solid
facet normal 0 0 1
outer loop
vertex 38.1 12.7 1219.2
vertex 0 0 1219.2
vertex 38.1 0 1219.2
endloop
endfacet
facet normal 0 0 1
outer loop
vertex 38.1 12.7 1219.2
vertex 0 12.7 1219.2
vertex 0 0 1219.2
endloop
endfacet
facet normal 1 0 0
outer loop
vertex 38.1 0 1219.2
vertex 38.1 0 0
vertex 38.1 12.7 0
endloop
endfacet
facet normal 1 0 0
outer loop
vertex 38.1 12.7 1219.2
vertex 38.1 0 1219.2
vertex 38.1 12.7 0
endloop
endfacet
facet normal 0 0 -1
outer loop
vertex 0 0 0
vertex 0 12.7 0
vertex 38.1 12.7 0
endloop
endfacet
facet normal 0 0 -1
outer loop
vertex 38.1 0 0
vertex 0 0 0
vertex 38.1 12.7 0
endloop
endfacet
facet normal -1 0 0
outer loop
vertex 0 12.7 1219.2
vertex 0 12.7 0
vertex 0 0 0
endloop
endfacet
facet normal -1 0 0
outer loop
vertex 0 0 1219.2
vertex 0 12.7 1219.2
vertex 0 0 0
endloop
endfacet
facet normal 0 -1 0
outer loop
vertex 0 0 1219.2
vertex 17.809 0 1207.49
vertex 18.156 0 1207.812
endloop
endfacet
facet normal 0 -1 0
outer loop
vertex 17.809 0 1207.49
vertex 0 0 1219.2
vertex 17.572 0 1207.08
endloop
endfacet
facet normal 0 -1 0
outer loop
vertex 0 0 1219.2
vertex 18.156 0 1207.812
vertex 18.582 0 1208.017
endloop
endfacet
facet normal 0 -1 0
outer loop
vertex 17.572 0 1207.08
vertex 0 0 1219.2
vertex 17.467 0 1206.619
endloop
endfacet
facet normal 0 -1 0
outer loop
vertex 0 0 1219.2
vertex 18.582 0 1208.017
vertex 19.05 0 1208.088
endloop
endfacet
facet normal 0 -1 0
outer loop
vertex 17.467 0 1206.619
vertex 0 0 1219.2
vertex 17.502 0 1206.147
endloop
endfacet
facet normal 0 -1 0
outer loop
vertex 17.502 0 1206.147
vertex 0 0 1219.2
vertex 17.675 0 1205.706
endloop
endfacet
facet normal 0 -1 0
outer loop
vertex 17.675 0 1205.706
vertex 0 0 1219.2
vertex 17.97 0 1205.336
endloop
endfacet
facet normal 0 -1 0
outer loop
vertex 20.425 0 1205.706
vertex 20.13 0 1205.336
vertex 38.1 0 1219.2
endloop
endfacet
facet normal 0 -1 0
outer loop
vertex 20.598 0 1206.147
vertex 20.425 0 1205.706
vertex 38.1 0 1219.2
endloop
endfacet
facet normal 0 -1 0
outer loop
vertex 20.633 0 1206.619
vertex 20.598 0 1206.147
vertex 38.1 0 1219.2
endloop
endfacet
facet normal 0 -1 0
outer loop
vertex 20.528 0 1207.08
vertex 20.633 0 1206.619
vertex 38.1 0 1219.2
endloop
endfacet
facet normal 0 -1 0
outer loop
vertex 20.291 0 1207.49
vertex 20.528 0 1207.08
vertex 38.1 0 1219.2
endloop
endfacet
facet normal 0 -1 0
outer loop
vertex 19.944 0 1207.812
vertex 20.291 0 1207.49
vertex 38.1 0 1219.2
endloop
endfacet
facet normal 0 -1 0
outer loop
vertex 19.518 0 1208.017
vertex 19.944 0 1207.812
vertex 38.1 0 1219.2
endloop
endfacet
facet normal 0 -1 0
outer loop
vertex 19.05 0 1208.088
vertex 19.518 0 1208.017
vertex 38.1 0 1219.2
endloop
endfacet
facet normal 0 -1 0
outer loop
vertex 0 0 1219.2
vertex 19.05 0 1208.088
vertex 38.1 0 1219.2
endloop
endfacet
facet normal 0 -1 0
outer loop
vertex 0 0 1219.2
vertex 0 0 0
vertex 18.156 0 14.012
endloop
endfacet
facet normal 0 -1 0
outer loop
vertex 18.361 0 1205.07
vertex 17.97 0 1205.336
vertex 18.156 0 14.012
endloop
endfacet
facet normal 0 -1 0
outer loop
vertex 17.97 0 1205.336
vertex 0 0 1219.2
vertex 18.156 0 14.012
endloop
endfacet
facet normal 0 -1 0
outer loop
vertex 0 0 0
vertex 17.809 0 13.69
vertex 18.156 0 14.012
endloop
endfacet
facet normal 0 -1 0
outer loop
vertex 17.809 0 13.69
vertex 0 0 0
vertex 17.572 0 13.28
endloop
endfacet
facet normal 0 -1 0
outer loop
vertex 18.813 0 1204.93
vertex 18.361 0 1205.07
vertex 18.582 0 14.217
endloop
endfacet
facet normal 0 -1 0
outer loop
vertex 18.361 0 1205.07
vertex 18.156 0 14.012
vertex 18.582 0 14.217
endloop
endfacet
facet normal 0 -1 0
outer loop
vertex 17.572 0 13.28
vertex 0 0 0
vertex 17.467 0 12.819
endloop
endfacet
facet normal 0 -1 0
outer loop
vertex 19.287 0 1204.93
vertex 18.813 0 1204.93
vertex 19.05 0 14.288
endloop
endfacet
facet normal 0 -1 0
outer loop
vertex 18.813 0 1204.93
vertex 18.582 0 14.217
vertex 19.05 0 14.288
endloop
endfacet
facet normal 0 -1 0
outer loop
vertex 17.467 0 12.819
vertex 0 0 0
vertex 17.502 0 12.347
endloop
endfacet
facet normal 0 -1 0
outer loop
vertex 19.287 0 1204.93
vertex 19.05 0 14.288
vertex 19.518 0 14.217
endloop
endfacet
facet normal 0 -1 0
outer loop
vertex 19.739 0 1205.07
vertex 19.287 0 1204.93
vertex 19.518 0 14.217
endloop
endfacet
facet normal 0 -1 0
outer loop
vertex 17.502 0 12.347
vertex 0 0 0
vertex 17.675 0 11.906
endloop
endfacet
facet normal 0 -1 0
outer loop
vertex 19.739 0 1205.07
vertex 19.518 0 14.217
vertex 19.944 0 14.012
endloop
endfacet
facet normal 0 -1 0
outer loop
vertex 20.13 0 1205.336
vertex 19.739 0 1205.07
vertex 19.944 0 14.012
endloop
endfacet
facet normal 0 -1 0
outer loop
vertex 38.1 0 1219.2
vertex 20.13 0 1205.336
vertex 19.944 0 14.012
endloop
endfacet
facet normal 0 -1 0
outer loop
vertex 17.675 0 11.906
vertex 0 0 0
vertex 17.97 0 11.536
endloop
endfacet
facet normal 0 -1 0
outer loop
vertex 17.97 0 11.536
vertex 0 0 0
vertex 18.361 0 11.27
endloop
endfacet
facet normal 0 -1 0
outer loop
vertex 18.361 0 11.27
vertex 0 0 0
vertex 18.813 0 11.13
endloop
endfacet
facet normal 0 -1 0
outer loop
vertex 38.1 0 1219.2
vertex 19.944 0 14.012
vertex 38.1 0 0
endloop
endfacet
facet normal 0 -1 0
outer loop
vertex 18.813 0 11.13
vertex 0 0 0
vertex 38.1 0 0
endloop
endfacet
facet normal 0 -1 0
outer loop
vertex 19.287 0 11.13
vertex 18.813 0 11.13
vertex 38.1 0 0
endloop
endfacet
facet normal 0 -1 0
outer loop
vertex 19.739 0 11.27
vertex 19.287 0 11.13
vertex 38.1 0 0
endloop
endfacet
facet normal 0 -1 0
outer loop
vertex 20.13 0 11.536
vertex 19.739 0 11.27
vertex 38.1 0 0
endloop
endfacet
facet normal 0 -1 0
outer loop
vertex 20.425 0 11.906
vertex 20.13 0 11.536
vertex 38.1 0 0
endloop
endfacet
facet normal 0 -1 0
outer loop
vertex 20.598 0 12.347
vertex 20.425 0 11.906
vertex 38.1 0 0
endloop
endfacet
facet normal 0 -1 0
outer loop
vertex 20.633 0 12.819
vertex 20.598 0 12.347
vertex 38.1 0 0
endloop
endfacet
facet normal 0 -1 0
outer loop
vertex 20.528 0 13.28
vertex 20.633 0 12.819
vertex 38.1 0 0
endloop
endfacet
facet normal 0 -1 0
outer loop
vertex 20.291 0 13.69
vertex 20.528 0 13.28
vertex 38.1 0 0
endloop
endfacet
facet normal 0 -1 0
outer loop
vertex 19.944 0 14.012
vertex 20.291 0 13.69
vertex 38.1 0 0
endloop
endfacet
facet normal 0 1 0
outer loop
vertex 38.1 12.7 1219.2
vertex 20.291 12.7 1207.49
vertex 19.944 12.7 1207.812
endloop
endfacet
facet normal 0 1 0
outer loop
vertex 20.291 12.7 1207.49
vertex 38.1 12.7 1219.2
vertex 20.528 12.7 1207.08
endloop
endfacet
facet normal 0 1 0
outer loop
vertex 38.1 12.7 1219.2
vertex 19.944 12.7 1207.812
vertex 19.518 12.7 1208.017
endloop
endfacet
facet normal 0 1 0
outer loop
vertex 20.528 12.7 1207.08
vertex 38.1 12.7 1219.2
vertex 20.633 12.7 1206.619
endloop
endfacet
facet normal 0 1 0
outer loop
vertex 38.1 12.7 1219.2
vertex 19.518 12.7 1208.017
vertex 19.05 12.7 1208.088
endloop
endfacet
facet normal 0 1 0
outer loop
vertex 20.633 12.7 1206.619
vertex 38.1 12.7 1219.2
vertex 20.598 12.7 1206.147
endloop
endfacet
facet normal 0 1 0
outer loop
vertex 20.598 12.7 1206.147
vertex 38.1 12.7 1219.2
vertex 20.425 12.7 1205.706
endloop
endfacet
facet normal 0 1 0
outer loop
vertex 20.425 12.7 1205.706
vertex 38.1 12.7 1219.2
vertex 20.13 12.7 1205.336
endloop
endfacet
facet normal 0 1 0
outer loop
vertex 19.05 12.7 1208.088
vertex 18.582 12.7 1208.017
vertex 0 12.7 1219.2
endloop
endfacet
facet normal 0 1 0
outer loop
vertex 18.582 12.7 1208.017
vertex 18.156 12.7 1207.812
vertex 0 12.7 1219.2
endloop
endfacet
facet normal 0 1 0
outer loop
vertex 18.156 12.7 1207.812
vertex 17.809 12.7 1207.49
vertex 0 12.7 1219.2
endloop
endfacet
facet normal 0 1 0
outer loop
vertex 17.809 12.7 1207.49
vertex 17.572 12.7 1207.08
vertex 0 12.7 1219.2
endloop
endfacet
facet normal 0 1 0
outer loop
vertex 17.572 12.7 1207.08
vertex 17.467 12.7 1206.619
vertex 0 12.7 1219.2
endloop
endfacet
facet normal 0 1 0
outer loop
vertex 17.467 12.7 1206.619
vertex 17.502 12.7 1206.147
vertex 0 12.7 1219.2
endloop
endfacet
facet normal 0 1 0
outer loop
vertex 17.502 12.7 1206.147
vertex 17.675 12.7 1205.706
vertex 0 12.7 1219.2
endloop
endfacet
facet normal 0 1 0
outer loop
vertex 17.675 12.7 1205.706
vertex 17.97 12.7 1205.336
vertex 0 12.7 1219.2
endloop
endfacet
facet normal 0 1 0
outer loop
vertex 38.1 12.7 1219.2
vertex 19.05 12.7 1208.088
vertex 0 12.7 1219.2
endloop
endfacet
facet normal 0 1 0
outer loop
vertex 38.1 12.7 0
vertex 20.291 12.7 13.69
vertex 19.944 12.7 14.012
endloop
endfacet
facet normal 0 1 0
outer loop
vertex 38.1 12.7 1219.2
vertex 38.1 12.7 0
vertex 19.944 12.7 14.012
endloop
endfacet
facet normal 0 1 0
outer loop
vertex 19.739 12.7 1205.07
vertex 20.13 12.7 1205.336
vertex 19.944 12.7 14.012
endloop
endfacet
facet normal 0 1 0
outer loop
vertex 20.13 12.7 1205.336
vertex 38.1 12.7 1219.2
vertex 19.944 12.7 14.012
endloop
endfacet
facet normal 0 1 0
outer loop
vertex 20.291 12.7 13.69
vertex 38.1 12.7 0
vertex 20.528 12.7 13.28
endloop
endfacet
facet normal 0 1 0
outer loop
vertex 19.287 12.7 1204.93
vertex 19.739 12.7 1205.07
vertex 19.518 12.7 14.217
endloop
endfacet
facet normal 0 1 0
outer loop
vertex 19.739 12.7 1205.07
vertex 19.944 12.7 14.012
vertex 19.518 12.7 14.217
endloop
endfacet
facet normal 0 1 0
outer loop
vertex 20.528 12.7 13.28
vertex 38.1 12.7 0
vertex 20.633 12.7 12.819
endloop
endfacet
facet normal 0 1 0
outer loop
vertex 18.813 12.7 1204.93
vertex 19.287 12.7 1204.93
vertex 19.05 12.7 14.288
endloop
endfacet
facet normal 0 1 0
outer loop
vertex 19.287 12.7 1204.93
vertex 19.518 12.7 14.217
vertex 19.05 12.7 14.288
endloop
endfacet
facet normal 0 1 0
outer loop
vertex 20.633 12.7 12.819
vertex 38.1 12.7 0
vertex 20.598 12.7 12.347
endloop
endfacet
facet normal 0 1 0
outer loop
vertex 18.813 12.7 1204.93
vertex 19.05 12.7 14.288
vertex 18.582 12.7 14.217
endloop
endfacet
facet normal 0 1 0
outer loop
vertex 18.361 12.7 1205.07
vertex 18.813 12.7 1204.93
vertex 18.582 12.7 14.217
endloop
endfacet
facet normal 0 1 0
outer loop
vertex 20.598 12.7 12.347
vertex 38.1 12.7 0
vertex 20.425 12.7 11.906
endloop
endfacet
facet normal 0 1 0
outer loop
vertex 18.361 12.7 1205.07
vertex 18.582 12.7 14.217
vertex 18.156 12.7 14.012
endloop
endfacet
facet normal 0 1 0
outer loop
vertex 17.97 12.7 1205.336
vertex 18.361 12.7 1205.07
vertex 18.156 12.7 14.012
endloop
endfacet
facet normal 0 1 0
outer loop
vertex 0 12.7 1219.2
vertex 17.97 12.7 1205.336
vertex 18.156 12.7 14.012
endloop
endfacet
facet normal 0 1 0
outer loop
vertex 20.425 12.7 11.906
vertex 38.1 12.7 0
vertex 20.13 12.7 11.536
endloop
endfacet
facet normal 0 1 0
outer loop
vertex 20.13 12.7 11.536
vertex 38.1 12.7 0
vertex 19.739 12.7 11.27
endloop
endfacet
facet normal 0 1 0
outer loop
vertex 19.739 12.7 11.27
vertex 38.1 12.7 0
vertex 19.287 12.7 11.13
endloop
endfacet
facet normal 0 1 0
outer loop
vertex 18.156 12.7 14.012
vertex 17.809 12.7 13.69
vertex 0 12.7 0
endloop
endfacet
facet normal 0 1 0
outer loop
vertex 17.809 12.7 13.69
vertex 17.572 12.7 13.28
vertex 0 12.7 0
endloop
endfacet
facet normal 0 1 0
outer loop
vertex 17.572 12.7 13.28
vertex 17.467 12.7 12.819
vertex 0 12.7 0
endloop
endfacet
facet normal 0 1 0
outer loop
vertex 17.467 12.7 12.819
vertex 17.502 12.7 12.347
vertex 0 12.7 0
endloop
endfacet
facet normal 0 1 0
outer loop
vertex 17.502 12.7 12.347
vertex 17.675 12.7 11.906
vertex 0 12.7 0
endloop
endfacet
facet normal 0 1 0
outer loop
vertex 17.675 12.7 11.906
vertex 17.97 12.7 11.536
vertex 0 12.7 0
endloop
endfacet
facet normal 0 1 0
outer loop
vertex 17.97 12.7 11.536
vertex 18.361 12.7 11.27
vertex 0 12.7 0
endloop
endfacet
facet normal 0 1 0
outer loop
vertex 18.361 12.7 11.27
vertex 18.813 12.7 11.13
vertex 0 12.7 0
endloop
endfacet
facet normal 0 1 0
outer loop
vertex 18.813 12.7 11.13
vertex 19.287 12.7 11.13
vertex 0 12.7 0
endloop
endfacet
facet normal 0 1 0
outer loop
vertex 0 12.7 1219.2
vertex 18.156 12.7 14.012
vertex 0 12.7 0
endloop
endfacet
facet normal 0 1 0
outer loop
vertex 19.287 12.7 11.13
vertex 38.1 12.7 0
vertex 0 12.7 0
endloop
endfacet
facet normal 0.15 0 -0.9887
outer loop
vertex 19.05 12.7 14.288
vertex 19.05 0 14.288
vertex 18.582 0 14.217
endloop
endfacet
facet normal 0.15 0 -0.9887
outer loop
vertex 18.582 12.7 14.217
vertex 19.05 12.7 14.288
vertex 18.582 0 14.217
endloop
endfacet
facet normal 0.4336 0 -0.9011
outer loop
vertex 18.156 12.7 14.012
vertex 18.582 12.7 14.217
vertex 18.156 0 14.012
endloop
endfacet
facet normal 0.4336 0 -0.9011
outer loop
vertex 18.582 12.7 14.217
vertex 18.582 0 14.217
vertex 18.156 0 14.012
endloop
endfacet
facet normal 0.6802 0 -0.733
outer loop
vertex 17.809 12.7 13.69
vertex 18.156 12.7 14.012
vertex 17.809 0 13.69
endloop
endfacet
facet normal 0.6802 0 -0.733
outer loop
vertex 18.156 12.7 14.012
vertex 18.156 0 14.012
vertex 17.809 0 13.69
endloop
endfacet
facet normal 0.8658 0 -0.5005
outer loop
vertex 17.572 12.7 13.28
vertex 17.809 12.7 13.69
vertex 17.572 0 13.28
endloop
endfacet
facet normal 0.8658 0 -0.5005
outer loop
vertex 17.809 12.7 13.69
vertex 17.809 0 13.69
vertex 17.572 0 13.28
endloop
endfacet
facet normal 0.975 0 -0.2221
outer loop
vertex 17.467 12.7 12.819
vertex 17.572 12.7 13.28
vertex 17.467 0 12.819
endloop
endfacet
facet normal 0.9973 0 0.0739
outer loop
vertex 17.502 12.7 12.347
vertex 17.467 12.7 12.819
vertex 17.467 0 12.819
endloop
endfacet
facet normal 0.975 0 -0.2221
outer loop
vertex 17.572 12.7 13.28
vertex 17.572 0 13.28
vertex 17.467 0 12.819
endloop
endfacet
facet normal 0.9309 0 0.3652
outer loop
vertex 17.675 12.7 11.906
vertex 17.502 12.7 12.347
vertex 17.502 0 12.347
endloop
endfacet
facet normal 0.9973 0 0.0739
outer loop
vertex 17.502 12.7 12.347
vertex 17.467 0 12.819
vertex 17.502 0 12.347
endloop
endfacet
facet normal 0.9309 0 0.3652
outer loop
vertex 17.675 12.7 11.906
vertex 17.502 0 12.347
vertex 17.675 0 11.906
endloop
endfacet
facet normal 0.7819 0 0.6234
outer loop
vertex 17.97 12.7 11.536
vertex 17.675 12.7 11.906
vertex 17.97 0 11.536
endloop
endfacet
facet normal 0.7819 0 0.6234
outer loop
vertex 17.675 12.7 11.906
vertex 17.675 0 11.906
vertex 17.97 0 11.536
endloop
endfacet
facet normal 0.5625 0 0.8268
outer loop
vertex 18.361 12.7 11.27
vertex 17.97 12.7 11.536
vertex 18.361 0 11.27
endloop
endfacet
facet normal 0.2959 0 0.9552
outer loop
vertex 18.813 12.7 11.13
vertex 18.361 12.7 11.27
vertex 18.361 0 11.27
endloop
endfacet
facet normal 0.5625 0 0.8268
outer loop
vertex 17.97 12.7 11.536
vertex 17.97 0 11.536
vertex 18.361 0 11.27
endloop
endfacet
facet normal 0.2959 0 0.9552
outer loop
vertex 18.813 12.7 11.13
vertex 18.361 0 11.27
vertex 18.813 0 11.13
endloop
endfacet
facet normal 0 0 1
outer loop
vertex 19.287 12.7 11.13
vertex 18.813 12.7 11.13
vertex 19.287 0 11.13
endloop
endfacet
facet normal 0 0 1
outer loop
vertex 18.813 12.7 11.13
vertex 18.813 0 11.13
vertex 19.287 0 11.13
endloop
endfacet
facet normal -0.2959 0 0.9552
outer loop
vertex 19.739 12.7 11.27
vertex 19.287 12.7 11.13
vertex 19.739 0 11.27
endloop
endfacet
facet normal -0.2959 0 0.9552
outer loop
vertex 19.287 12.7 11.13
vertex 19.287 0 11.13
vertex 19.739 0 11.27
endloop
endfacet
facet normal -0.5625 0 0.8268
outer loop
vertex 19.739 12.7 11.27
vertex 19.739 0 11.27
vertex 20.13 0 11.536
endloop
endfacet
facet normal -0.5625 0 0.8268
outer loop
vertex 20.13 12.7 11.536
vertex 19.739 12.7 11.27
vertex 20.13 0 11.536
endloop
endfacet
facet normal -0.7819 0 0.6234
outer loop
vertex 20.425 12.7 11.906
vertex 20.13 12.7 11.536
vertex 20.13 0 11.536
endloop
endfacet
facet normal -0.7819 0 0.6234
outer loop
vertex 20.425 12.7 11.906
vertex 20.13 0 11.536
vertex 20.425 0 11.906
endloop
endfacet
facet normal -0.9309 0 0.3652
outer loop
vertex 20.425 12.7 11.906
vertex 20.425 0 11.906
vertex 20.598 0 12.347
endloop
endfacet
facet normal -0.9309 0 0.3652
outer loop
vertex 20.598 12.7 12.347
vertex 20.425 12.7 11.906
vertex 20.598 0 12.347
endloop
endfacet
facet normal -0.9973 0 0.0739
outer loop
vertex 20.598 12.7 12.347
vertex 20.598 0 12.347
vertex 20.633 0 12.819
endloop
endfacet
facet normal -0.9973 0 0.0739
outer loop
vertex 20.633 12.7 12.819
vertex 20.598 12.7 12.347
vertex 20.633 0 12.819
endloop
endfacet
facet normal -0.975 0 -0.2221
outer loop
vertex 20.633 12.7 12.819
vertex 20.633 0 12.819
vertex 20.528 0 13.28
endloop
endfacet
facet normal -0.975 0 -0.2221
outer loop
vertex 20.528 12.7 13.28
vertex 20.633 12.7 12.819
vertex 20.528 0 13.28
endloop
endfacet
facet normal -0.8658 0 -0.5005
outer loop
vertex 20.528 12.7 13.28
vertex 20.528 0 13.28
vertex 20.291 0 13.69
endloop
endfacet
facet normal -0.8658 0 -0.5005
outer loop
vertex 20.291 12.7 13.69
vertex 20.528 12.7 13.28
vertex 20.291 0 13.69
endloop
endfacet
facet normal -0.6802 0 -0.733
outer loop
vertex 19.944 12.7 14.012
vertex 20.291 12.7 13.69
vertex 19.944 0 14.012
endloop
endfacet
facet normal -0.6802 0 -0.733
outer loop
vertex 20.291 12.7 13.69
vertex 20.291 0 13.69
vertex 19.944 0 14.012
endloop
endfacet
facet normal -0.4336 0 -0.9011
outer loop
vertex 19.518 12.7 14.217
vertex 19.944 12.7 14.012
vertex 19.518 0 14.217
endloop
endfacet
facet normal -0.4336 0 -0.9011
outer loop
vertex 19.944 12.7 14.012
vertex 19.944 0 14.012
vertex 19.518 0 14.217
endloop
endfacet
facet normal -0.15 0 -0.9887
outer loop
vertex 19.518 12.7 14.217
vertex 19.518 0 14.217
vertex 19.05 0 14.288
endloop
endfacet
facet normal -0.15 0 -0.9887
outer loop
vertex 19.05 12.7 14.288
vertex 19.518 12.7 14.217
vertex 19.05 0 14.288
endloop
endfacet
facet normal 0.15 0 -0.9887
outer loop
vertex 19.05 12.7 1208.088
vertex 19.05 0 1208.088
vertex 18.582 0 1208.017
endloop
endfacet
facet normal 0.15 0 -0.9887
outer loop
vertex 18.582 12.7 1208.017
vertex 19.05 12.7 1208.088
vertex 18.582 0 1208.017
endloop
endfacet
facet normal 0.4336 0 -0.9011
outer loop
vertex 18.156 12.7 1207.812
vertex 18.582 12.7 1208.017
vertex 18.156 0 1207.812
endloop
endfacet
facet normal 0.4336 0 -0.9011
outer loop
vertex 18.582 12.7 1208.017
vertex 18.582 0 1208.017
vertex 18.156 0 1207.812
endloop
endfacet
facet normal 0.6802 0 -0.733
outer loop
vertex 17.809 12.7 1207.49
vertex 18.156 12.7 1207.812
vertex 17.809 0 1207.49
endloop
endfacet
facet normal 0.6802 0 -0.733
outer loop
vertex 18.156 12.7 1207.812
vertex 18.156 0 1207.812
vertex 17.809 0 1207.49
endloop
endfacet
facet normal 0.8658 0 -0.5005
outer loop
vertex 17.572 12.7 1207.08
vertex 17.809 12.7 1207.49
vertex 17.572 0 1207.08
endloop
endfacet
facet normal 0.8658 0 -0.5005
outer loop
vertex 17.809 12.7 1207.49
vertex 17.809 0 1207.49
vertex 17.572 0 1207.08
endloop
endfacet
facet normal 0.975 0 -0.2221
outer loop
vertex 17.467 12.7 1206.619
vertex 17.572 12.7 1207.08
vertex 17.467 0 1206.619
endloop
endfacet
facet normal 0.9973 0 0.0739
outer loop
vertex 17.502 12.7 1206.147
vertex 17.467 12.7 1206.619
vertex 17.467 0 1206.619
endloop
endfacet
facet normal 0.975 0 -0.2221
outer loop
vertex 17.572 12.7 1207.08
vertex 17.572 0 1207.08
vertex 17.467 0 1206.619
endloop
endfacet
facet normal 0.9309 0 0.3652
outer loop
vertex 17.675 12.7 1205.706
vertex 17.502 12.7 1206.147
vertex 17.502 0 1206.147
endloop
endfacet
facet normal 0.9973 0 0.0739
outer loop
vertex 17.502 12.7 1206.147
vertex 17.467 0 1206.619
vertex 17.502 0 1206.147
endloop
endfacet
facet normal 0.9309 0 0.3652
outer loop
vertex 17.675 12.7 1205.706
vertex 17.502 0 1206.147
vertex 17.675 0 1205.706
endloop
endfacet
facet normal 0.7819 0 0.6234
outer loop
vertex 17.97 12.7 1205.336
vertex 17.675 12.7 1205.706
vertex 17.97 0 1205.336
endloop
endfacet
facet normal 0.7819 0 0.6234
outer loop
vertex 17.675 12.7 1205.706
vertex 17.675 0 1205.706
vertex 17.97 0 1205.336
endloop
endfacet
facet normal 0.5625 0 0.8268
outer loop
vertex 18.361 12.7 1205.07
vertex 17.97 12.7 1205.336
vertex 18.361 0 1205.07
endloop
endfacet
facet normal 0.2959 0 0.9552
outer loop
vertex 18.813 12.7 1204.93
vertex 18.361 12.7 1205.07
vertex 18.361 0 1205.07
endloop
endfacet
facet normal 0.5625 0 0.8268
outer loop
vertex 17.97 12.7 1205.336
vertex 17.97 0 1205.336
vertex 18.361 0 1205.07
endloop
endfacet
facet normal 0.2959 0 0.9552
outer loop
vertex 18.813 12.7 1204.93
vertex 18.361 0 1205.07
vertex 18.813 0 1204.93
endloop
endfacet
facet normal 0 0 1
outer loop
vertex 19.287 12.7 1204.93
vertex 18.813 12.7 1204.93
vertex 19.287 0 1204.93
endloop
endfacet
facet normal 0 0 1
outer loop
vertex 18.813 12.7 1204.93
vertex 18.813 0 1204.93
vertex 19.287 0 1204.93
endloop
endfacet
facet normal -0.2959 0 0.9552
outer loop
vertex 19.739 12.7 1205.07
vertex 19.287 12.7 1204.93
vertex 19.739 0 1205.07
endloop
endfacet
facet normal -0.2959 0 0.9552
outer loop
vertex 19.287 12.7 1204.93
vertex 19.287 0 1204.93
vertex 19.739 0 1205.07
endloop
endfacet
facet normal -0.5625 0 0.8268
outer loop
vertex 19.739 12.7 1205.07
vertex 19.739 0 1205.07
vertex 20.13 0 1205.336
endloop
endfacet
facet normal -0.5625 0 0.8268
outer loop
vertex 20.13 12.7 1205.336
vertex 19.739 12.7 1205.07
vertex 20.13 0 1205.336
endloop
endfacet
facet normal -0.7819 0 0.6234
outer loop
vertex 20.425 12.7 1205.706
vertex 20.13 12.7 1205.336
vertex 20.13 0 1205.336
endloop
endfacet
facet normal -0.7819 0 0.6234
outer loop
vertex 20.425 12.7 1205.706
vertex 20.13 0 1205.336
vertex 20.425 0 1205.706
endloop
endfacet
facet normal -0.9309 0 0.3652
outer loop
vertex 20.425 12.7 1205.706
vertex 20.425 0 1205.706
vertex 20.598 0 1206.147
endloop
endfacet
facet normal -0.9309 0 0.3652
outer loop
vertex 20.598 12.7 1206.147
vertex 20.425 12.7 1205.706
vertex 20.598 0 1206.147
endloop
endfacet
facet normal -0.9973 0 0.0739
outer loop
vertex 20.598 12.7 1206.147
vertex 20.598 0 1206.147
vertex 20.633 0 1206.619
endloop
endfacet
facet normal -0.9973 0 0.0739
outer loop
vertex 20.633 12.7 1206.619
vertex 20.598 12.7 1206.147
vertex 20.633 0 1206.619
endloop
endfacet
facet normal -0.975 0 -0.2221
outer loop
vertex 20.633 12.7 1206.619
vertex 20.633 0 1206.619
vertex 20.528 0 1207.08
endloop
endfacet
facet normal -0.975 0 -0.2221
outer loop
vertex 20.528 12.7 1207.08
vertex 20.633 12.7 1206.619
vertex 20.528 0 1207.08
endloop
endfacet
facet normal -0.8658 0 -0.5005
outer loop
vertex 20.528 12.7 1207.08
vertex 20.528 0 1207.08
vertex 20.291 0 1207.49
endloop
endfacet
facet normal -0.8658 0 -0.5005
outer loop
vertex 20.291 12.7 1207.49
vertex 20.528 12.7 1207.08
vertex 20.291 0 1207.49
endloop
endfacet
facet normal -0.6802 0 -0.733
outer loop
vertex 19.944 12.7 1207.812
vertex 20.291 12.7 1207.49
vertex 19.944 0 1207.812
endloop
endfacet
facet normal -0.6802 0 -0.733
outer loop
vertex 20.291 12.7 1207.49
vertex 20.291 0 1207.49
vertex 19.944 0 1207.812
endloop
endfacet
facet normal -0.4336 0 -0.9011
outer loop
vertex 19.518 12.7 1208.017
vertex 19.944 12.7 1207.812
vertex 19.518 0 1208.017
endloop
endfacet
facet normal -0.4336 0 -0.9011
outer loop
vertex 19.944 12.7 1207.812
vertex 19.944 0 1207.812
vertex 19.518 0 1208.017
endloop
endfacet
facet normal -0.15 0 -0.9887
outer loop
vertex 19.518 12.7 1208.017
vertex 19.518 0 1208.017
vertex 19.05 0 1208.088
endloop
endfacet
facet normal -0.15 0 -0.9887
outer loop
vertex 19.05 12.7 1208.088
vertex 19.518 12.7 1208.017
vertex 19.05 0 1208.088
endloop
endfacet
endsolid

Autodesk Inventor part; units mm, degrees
ref_plane "YZ Plane" through (0, 0, 0) normal (1, 0, 0) x (0, 1, 0)
ref_plane "XZ Plane" through (0, 0, 0) normal (0, 1, 0) x (-1, 0, 0)
ref_plane "XY Plane" through (0, 0, 0) normal (0, 0, 1) x (1, 0, 0)
sketch "Sketch1" plane through (0, 0, 0) normal (0, 0, 1) x (1, 0, 0)
  line L0 (0, 0) -> (38.1, 0)
  line L1 (38.1, 0) -> (38.1, 12.7)
  line L2 (38.1, 12.7) -> (0, 12.7)
  line L3 (0, 12.7) -> (0, 0)
  dimension "d0" = 38.1
  dimension "d1" = 12.7
extrude "Extrusion1" add sketch "Sketch1" along normal blind 1219.2
sketch "Sketch2" plane through (0, 12.7, 0) normal (0, 1, 0) x (1, 0, 0)
  line L0 (38.1, 0) -> (0, 0) projected
  circle A0 centre (19.05, -12.7) radius 2.2451
  dimension "d4" = 12.7
hole "Hole1" at (19.05, 12.7, 12.7) direction (0, -1, 0) diameter 3.175 end through all
sketch "Sketch3" plane through (0, 12.7, 0) normal (0, 1, 0) x (1, 0, 0)
  line L0 (38.1, -1219.2) -> (0, -1219.2) projected
  circle A0 centre (19.05, -1206.5) radius 2.2451
  dimension "d12" = 12.7
hole "Hole2" at (19.05, 12.7, 1206.5) direction (0, -1, 0) diameter 3.175 end through all
properties part number "firringStrip1" material "Wood (Cherry)"
